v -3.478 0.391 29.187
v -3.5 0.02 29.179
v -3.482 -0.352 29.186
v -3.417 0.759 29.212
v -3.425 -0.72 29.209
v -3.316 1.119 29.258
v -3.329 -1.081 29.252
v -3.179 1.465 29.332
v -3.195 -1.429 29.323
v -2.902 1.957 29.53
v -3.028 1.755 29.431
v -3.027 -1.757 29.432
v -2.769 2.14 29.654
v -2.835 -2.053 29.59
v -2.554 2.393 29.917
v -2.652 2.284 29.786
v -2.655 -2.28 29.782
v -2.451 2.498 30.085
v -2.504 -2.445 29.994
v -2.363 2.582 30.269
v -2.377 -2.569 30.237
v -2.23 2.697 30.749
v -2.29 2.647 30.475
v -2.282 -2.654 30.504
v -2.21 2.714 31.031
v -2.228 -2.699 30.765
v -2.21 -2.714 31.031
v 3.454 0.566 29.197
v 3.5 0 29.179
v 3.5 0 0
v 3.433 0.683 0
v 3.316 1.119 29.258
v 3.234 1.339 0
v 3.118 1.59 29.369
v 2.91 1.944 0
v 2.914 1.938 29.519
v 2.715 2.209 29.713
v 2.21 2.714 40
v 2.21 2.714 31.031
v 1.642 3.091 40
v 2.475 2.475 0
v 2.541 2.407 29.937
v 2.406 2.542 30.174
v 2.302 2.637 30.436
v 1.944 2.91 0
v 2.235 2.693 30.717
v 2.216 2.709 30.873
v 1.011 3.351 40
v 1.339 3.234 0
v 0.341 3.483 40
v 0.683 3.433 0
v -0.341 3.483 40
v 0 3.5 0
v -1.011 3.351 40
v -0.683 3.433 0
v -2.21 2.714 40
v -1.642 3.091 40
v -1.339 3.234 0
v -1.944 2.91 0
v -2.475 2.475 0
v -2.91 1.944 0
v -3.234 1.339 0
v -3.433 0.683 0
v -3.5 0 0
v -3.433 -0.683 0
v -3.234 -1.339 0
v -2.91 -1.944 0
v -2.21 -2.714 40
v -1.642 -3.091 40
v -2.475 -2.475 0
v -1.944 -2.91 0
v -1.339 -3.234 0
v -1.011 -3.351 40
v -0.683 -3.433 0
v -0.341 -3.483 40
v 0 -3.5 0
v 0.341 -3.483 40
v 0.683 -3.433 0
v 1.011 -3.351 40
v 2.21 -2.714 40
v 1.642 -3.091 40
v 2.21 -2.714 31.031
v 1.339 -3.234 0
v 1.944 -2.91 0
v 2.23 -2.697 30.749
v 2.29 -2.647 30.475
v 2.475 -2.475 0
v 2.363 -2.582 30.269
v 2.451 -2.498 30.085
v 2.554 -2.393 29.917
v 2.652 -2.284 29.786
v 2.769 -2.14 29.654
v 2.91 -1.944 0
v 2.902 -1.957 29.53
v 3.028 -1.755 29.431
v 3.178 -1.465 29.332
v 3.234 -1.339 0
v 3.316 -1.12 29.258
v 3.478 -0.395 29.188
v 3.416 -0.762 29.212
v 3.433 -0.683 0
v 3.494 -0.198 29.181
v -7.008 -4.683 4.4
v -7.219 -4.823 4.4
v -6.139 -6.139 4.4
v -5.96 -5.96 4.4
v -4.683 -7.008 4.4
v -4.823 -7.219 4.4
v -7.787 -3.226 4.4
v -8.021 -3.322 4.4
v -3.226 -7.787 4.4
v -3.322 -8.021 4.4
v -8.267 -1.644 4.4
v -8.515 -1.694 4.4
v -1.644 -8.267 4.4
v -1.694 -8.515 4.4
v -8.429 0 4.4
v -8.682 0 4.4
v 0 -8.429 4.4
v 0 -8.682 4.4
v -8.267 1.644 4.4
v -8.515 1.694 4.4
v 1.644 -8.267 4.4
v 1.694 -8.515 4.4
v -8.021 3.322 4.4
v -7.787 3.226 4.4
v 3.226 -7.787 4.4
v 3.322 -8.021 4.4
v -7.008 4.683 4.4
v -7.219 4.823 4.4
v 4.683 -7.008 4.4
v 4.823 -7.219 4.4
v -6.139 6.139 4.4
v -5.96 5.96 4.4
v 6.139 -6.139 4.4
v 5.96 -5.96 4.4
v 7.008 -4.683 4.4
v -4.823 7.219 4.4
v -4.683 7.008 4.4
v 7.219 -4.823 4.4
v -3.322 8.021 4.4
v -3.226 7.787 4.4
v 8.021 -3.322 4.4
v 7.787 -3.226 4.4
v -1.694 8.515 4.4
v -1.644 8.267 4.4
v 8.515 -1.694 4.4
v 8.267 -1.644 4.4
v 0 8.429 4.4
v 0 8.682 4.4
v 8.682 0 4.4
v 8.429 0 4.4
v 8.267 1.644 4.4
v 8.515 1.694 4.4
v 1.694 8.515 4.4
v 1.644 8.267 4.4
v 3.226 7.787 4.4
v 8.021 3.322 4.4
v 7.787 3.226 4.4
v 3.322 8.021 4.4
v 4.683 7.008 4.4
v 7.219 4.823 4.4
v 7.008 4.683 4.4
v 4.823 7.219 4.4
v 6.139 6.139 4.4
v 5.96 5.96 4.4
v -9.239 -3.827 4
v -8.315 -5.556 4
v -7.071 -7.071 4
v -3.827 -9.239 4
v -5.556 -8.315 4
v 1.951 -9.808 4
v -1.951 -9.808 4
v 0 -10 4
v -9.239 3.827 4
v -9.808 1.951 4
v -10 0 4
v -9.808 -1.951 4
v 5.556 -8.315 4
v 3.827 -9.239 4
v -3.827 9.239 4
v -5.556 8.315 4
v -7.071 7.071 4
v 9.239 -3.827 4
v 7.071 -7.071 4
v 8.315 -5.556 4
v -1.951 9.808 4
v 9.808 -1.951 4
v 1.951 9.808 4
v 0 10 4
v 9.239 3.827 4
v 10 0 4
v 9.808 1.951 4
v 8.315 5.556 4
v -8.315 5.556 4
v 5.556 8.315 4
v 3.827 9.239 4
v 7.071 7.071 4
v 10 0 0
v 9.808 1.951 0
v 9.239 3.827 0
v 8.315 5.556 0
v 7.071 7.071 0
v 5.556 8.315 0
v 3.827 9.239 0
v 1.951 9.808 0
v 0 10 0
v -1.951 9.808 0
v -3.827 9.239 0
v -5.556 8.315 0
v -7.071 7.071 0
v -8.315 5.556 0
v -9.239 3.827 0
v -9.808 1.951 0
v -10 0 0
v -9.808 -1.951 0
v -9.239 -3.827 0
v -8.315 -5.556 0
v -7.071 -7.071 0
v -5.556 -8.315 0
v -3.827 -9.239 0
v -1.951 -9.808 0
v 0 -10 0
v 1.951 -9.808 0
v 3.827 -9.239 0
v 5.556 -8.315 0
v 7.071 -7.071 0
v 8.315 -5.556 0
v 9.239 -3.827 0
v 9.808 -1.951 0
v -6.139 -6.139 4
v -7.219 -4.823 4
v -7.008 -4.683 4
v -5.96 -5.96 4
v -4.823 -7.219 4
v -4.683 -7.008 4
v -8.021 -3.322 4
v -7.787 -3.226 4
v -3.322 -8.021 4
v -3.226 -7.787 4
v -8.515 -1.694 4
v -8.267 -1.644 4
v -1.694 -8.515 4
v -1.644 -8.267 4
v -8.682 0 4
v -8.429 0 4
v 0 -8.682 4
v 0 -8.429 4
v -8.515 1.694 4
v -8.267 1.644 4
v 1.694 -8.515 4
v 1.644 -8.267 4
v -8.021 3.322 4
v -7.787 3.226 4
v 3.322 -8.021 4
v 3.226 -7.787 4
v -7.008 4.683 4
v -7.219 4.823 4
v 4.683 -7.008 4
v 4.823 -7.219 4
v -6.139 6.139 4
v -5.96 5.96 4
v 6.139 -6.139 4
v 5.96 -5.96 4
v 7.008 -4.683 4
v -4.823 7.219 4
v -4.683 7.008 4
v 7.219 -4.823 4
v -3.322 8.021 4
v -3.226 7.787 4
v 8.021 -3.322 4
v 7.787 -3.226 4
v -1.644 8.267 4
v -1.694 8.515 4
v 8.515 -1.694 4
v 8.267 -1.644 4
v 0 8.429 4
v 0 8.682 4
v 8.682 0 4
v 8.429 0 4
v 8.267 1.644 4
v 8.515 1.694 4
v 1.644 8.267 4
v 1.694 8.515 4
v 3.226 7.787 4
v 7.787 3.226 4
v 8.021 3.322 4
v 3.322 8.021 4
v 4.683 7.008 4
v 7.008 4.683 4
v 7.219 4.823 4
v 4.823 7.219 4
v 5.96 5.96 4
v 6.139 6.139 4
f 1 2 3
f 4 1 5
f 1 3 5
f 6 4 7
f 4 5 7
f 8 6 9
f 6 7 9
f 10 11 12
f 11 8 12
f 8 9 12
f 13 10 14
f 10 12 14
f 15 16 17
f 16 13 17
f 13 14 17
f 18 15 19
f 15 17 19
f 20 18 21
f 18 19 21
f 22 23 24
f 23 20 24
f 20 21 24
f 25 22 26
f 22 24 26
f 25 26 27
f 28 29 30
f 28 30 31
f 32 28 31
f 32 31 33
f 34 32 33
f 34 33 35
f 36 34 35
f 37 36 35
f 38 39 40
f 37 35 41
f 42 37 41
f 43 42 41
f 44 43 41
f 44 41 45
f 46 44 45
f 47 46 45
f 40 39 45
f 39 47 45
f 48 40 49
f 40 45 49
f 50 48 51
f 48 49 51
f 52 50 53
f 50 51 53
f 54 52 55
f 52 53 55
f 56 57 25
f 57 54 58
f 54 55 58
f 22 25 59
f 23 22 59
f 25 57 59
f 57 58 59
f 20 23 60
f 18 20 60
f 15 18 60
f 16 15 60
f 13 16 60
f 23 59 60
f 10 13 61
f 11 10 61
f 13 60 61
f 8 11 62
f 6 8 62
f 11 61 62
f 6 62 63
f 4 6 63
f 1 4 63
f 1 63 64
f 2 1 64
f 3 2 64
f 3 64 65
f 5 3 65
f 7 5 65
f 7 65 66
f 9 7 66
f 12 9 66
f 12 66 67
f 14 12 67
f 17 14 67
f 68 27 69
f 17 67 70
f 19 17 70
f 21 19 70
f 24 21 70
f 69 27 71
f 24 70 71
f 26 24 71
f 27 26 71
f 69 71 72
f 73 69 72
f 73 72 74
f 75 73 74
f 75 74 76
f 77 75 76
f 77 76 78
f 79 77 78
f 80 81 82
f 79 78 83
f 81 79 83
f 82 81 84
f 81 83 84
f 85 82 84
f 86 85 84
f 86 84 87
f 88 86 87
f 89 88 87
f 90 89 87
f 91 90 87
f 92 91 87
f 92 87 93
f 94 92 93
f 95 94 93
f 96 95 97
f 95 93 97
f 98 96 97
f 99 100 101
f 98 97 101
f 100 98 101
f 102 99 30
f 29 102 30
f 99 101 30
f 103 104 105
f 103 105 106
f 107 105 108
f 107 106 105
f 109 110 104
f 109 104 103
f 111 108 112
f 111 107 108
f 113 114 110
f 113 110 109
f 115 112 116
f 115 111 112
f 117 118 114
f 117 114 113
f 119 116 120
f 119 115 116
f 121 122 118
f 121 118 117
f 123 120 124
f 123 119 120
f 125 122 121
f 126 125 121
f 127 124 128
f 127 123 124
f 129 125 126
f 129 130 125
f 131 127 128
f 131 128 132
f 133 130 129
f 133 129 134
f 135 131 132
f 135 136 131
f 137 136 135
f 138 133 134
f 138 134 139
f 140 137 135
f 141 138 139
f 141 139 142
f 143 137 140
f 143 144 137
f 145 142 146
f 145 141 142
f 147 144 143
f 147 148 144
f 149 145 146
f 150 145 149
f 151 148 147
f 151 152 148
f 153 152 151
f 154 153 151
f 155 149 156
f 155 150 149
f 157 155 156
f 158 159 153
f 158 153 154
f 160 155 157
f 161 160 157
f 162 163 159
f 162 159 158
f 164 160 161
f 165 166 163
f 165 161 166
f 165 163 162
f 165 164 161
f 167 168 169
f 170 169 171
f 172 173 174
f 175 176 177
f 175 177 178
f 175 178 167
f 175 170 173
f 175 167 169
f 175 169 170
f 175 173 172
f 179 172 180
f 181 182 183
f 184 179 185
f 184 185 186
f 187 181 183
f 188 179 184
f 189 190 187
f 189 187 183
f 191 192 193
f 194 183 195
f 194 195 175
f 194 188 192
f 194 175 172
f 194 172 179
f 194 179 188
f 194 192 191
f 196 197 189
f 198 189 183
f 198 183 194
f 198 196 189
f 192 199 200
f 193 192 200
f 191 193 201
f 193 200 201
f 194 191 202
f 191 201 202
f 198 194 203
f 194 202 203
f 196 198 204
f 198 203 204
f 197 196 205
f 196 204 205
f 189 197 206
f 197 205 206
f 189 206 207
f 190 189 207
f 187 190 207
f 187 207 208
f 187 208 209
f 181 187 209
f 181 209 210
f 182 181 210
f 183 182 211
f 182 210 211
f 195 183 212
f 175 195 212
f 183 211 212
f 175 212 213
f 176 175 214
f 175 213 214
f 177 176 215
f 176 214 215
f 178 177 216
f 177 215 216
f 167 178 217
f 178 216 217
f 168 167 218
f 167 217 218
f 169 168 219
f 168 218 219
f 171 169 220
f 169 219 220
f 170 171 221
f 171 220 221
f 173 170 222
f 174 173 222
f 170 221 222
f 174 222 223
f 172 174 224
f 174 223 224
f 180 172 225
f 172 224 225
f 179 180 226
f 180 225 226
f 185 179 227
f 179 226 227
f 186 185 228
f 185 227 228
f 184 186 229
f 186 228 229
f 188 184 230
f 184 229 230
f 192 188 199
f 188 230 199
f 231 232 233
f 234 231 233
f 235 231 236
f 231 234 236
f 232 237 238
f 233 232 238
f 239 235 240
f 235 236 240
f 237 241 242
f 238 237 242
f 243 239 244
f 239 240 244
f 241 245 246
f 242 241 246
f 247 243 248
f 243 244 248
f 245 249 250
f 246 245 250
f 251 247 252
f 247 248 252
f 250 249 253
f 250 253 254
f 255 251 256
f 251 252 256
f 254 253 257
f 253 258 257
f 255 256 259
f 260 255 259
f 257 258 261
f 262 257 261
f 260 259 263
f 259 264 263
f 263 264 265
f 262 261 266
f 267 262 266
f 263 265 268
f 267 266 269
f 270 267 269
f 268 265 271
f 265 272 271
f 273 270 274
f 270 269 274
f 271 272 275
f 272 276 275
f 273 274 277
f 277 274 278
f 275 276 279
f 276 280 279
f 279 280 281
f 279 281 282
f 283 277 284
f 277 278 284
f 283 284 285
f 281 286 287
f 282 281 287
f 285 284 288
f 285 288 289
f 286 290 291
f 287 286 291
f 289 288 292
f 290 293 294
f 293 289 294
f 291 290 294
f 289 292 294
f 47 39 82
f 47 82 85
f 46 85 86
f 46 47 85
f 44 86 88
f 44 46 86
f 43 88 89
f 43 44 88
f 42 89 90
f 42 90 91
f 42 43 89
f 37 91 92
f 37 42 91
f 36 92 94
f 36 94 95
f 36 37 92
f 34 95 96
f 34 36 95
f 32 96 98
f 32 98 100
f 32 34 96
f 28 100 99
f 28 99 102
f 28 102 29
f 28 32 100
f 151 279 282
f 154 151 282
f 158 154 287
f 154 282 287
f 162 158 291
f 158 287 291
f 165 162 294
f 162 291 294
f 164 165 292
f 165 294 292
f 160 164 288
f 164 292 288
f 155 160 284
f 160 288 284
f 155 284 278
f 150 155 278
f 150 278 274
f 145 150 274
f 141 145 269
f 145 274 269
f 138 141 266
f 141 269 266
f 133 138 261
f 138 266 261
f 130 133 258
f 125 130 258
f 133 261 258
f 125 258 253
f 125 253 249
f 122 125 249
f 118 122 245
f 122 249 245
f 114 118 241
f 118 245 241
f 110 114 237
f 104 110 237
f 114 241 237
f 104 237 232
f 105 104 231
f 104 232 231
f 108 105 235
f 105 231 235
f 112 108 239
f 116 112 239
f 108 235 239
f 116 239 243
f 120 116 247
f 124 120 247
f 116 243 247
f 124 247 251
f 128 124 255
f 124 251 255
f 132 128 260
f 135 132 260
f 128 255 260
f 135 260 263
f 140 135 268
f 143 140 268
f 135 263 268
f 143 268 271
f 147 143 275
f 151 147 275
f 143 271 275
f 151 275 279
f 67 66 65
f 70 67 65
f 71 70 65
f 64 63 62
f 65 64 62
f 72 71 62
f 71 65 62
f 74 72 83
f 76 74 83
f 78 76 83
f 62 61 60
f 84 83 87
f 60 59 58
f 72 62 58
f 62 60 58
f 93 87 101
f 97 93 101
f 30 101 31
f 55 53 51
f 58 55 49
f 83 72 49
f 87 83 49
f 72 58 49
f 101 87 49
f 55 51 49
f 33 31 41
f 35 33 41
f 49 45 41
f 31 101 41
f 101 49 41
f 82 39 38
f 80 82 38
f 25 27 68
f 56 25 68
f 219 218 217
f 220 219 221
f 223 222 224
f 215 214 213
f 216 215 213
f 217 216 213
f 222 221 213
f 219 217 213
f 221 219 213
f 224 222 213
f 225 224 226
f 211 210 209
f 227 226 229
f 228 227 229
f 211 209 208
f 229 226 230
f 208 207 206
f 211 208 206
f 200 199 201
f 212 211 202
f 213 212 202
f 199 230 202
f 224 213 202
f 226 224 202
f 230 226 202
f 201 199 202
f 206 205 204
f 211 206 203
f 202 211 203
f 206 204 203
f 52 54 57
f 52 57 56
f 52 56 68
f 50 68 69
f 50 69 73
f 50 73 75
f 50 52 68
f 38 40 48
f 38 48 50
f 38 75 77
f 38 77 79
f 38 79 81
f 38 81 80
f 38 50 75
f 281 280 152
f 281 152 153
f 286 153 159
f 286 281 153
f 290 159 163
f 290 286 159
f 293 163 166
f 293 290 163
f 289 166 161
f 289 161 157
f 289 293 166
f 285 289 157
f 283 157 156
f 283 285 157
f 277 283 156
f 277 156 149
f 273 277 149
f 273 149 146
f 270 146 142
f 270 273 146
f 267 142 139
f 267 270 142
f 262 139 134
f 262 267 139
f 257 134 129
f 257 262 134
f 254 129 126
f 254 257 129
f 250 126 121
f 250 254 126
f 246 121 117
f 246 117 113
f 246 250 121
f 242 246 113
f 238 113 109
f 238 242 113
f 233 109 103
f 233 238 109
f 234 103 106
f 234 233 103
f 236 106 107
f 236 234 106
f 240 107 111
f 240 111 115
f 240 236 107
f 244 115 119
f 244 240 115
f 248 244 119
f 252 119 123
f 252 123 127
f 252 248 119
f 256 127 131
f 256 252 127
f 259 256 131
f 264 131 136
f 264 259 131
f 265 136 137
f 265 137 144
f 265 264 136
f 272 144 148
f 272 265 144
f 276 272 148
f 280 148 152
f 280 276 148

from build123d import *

# Parameters (mm, degrees)
F0_R     = 10
F0_R_2   = 3.5
F1_DEPTH = 4
F2_DEPTH = 40
F3_R     = 8.6820439201
F3_R_2   = 8.4287358905
F4_DEPTH = 0.4
F5_W     = 3.9470982738
F5_H     = 10.0623220205
F6_DEPTH = 12.5


# Not quite as in the source:
# - a feature names something its author has since deleted; it is built from what else it names


with BuildPart() as f1:
    # F0 (on Top) → F1 (new body)
    with BuildSketch(Plane.XY):
        Circle(F0_R)
        Circle(F0_R_2, mode=Mode.SUBTRACT)
        Circle(F0_R_2)
    extrude(amount=F1_DEPTH)


with BuildPart() as f2:
    # F0 (on Top) → F2 (new body)
    with BuildSketch(Plane.XY):
        Circle(F0_R_2)
    extrude(amount=F2_DEPTH)

    # F5 (on Front) → F6 (cut, symmetric)
    with BuildSketch(Plane.XZ):
        with Locations((4.183649784, 36.0617563128)):
            Rectangle(F5_W, F5_H)
        with BuildLine():
            Line((6.1571989208, 31.0305953026), (2.2101006471, 31.0305953026))
            ThreePointArc((2.2101006471, 31.0305953026), (4.183649784, 29.0570461657), (6.1571989208, 31.0305953026))
        make_face()
        with Locations((-4.183649784, 36.0617563128)):
            Rectangle(F5_W, F5_H)
        with BuildLine():
            ThreePointArc((-6.1571989208, 31.0305953026), (-4.183649784, 29.0570461657), (-2.2101006471, 31.0305953026))
            Line((-2.2101006471, 31.0305953026), (-6.1571989208, 31.0305953026))
        make_face()
    extrude(amount=F6_DEPTH, both=True, mode=Mode.SUBTRACT)


with BuildPart() as f4:
    # F3 (on face) → F4 (new body)
    with BuildSketch(Plane.XY.offset(4)):
        Circle(F3_R)
        Circle(F3_R_2, mode=Mode.SUBTRACT)
    extrude(amount=F4_DEPTH)


solid = Compound([f1.part, f2.part, f4.part])
